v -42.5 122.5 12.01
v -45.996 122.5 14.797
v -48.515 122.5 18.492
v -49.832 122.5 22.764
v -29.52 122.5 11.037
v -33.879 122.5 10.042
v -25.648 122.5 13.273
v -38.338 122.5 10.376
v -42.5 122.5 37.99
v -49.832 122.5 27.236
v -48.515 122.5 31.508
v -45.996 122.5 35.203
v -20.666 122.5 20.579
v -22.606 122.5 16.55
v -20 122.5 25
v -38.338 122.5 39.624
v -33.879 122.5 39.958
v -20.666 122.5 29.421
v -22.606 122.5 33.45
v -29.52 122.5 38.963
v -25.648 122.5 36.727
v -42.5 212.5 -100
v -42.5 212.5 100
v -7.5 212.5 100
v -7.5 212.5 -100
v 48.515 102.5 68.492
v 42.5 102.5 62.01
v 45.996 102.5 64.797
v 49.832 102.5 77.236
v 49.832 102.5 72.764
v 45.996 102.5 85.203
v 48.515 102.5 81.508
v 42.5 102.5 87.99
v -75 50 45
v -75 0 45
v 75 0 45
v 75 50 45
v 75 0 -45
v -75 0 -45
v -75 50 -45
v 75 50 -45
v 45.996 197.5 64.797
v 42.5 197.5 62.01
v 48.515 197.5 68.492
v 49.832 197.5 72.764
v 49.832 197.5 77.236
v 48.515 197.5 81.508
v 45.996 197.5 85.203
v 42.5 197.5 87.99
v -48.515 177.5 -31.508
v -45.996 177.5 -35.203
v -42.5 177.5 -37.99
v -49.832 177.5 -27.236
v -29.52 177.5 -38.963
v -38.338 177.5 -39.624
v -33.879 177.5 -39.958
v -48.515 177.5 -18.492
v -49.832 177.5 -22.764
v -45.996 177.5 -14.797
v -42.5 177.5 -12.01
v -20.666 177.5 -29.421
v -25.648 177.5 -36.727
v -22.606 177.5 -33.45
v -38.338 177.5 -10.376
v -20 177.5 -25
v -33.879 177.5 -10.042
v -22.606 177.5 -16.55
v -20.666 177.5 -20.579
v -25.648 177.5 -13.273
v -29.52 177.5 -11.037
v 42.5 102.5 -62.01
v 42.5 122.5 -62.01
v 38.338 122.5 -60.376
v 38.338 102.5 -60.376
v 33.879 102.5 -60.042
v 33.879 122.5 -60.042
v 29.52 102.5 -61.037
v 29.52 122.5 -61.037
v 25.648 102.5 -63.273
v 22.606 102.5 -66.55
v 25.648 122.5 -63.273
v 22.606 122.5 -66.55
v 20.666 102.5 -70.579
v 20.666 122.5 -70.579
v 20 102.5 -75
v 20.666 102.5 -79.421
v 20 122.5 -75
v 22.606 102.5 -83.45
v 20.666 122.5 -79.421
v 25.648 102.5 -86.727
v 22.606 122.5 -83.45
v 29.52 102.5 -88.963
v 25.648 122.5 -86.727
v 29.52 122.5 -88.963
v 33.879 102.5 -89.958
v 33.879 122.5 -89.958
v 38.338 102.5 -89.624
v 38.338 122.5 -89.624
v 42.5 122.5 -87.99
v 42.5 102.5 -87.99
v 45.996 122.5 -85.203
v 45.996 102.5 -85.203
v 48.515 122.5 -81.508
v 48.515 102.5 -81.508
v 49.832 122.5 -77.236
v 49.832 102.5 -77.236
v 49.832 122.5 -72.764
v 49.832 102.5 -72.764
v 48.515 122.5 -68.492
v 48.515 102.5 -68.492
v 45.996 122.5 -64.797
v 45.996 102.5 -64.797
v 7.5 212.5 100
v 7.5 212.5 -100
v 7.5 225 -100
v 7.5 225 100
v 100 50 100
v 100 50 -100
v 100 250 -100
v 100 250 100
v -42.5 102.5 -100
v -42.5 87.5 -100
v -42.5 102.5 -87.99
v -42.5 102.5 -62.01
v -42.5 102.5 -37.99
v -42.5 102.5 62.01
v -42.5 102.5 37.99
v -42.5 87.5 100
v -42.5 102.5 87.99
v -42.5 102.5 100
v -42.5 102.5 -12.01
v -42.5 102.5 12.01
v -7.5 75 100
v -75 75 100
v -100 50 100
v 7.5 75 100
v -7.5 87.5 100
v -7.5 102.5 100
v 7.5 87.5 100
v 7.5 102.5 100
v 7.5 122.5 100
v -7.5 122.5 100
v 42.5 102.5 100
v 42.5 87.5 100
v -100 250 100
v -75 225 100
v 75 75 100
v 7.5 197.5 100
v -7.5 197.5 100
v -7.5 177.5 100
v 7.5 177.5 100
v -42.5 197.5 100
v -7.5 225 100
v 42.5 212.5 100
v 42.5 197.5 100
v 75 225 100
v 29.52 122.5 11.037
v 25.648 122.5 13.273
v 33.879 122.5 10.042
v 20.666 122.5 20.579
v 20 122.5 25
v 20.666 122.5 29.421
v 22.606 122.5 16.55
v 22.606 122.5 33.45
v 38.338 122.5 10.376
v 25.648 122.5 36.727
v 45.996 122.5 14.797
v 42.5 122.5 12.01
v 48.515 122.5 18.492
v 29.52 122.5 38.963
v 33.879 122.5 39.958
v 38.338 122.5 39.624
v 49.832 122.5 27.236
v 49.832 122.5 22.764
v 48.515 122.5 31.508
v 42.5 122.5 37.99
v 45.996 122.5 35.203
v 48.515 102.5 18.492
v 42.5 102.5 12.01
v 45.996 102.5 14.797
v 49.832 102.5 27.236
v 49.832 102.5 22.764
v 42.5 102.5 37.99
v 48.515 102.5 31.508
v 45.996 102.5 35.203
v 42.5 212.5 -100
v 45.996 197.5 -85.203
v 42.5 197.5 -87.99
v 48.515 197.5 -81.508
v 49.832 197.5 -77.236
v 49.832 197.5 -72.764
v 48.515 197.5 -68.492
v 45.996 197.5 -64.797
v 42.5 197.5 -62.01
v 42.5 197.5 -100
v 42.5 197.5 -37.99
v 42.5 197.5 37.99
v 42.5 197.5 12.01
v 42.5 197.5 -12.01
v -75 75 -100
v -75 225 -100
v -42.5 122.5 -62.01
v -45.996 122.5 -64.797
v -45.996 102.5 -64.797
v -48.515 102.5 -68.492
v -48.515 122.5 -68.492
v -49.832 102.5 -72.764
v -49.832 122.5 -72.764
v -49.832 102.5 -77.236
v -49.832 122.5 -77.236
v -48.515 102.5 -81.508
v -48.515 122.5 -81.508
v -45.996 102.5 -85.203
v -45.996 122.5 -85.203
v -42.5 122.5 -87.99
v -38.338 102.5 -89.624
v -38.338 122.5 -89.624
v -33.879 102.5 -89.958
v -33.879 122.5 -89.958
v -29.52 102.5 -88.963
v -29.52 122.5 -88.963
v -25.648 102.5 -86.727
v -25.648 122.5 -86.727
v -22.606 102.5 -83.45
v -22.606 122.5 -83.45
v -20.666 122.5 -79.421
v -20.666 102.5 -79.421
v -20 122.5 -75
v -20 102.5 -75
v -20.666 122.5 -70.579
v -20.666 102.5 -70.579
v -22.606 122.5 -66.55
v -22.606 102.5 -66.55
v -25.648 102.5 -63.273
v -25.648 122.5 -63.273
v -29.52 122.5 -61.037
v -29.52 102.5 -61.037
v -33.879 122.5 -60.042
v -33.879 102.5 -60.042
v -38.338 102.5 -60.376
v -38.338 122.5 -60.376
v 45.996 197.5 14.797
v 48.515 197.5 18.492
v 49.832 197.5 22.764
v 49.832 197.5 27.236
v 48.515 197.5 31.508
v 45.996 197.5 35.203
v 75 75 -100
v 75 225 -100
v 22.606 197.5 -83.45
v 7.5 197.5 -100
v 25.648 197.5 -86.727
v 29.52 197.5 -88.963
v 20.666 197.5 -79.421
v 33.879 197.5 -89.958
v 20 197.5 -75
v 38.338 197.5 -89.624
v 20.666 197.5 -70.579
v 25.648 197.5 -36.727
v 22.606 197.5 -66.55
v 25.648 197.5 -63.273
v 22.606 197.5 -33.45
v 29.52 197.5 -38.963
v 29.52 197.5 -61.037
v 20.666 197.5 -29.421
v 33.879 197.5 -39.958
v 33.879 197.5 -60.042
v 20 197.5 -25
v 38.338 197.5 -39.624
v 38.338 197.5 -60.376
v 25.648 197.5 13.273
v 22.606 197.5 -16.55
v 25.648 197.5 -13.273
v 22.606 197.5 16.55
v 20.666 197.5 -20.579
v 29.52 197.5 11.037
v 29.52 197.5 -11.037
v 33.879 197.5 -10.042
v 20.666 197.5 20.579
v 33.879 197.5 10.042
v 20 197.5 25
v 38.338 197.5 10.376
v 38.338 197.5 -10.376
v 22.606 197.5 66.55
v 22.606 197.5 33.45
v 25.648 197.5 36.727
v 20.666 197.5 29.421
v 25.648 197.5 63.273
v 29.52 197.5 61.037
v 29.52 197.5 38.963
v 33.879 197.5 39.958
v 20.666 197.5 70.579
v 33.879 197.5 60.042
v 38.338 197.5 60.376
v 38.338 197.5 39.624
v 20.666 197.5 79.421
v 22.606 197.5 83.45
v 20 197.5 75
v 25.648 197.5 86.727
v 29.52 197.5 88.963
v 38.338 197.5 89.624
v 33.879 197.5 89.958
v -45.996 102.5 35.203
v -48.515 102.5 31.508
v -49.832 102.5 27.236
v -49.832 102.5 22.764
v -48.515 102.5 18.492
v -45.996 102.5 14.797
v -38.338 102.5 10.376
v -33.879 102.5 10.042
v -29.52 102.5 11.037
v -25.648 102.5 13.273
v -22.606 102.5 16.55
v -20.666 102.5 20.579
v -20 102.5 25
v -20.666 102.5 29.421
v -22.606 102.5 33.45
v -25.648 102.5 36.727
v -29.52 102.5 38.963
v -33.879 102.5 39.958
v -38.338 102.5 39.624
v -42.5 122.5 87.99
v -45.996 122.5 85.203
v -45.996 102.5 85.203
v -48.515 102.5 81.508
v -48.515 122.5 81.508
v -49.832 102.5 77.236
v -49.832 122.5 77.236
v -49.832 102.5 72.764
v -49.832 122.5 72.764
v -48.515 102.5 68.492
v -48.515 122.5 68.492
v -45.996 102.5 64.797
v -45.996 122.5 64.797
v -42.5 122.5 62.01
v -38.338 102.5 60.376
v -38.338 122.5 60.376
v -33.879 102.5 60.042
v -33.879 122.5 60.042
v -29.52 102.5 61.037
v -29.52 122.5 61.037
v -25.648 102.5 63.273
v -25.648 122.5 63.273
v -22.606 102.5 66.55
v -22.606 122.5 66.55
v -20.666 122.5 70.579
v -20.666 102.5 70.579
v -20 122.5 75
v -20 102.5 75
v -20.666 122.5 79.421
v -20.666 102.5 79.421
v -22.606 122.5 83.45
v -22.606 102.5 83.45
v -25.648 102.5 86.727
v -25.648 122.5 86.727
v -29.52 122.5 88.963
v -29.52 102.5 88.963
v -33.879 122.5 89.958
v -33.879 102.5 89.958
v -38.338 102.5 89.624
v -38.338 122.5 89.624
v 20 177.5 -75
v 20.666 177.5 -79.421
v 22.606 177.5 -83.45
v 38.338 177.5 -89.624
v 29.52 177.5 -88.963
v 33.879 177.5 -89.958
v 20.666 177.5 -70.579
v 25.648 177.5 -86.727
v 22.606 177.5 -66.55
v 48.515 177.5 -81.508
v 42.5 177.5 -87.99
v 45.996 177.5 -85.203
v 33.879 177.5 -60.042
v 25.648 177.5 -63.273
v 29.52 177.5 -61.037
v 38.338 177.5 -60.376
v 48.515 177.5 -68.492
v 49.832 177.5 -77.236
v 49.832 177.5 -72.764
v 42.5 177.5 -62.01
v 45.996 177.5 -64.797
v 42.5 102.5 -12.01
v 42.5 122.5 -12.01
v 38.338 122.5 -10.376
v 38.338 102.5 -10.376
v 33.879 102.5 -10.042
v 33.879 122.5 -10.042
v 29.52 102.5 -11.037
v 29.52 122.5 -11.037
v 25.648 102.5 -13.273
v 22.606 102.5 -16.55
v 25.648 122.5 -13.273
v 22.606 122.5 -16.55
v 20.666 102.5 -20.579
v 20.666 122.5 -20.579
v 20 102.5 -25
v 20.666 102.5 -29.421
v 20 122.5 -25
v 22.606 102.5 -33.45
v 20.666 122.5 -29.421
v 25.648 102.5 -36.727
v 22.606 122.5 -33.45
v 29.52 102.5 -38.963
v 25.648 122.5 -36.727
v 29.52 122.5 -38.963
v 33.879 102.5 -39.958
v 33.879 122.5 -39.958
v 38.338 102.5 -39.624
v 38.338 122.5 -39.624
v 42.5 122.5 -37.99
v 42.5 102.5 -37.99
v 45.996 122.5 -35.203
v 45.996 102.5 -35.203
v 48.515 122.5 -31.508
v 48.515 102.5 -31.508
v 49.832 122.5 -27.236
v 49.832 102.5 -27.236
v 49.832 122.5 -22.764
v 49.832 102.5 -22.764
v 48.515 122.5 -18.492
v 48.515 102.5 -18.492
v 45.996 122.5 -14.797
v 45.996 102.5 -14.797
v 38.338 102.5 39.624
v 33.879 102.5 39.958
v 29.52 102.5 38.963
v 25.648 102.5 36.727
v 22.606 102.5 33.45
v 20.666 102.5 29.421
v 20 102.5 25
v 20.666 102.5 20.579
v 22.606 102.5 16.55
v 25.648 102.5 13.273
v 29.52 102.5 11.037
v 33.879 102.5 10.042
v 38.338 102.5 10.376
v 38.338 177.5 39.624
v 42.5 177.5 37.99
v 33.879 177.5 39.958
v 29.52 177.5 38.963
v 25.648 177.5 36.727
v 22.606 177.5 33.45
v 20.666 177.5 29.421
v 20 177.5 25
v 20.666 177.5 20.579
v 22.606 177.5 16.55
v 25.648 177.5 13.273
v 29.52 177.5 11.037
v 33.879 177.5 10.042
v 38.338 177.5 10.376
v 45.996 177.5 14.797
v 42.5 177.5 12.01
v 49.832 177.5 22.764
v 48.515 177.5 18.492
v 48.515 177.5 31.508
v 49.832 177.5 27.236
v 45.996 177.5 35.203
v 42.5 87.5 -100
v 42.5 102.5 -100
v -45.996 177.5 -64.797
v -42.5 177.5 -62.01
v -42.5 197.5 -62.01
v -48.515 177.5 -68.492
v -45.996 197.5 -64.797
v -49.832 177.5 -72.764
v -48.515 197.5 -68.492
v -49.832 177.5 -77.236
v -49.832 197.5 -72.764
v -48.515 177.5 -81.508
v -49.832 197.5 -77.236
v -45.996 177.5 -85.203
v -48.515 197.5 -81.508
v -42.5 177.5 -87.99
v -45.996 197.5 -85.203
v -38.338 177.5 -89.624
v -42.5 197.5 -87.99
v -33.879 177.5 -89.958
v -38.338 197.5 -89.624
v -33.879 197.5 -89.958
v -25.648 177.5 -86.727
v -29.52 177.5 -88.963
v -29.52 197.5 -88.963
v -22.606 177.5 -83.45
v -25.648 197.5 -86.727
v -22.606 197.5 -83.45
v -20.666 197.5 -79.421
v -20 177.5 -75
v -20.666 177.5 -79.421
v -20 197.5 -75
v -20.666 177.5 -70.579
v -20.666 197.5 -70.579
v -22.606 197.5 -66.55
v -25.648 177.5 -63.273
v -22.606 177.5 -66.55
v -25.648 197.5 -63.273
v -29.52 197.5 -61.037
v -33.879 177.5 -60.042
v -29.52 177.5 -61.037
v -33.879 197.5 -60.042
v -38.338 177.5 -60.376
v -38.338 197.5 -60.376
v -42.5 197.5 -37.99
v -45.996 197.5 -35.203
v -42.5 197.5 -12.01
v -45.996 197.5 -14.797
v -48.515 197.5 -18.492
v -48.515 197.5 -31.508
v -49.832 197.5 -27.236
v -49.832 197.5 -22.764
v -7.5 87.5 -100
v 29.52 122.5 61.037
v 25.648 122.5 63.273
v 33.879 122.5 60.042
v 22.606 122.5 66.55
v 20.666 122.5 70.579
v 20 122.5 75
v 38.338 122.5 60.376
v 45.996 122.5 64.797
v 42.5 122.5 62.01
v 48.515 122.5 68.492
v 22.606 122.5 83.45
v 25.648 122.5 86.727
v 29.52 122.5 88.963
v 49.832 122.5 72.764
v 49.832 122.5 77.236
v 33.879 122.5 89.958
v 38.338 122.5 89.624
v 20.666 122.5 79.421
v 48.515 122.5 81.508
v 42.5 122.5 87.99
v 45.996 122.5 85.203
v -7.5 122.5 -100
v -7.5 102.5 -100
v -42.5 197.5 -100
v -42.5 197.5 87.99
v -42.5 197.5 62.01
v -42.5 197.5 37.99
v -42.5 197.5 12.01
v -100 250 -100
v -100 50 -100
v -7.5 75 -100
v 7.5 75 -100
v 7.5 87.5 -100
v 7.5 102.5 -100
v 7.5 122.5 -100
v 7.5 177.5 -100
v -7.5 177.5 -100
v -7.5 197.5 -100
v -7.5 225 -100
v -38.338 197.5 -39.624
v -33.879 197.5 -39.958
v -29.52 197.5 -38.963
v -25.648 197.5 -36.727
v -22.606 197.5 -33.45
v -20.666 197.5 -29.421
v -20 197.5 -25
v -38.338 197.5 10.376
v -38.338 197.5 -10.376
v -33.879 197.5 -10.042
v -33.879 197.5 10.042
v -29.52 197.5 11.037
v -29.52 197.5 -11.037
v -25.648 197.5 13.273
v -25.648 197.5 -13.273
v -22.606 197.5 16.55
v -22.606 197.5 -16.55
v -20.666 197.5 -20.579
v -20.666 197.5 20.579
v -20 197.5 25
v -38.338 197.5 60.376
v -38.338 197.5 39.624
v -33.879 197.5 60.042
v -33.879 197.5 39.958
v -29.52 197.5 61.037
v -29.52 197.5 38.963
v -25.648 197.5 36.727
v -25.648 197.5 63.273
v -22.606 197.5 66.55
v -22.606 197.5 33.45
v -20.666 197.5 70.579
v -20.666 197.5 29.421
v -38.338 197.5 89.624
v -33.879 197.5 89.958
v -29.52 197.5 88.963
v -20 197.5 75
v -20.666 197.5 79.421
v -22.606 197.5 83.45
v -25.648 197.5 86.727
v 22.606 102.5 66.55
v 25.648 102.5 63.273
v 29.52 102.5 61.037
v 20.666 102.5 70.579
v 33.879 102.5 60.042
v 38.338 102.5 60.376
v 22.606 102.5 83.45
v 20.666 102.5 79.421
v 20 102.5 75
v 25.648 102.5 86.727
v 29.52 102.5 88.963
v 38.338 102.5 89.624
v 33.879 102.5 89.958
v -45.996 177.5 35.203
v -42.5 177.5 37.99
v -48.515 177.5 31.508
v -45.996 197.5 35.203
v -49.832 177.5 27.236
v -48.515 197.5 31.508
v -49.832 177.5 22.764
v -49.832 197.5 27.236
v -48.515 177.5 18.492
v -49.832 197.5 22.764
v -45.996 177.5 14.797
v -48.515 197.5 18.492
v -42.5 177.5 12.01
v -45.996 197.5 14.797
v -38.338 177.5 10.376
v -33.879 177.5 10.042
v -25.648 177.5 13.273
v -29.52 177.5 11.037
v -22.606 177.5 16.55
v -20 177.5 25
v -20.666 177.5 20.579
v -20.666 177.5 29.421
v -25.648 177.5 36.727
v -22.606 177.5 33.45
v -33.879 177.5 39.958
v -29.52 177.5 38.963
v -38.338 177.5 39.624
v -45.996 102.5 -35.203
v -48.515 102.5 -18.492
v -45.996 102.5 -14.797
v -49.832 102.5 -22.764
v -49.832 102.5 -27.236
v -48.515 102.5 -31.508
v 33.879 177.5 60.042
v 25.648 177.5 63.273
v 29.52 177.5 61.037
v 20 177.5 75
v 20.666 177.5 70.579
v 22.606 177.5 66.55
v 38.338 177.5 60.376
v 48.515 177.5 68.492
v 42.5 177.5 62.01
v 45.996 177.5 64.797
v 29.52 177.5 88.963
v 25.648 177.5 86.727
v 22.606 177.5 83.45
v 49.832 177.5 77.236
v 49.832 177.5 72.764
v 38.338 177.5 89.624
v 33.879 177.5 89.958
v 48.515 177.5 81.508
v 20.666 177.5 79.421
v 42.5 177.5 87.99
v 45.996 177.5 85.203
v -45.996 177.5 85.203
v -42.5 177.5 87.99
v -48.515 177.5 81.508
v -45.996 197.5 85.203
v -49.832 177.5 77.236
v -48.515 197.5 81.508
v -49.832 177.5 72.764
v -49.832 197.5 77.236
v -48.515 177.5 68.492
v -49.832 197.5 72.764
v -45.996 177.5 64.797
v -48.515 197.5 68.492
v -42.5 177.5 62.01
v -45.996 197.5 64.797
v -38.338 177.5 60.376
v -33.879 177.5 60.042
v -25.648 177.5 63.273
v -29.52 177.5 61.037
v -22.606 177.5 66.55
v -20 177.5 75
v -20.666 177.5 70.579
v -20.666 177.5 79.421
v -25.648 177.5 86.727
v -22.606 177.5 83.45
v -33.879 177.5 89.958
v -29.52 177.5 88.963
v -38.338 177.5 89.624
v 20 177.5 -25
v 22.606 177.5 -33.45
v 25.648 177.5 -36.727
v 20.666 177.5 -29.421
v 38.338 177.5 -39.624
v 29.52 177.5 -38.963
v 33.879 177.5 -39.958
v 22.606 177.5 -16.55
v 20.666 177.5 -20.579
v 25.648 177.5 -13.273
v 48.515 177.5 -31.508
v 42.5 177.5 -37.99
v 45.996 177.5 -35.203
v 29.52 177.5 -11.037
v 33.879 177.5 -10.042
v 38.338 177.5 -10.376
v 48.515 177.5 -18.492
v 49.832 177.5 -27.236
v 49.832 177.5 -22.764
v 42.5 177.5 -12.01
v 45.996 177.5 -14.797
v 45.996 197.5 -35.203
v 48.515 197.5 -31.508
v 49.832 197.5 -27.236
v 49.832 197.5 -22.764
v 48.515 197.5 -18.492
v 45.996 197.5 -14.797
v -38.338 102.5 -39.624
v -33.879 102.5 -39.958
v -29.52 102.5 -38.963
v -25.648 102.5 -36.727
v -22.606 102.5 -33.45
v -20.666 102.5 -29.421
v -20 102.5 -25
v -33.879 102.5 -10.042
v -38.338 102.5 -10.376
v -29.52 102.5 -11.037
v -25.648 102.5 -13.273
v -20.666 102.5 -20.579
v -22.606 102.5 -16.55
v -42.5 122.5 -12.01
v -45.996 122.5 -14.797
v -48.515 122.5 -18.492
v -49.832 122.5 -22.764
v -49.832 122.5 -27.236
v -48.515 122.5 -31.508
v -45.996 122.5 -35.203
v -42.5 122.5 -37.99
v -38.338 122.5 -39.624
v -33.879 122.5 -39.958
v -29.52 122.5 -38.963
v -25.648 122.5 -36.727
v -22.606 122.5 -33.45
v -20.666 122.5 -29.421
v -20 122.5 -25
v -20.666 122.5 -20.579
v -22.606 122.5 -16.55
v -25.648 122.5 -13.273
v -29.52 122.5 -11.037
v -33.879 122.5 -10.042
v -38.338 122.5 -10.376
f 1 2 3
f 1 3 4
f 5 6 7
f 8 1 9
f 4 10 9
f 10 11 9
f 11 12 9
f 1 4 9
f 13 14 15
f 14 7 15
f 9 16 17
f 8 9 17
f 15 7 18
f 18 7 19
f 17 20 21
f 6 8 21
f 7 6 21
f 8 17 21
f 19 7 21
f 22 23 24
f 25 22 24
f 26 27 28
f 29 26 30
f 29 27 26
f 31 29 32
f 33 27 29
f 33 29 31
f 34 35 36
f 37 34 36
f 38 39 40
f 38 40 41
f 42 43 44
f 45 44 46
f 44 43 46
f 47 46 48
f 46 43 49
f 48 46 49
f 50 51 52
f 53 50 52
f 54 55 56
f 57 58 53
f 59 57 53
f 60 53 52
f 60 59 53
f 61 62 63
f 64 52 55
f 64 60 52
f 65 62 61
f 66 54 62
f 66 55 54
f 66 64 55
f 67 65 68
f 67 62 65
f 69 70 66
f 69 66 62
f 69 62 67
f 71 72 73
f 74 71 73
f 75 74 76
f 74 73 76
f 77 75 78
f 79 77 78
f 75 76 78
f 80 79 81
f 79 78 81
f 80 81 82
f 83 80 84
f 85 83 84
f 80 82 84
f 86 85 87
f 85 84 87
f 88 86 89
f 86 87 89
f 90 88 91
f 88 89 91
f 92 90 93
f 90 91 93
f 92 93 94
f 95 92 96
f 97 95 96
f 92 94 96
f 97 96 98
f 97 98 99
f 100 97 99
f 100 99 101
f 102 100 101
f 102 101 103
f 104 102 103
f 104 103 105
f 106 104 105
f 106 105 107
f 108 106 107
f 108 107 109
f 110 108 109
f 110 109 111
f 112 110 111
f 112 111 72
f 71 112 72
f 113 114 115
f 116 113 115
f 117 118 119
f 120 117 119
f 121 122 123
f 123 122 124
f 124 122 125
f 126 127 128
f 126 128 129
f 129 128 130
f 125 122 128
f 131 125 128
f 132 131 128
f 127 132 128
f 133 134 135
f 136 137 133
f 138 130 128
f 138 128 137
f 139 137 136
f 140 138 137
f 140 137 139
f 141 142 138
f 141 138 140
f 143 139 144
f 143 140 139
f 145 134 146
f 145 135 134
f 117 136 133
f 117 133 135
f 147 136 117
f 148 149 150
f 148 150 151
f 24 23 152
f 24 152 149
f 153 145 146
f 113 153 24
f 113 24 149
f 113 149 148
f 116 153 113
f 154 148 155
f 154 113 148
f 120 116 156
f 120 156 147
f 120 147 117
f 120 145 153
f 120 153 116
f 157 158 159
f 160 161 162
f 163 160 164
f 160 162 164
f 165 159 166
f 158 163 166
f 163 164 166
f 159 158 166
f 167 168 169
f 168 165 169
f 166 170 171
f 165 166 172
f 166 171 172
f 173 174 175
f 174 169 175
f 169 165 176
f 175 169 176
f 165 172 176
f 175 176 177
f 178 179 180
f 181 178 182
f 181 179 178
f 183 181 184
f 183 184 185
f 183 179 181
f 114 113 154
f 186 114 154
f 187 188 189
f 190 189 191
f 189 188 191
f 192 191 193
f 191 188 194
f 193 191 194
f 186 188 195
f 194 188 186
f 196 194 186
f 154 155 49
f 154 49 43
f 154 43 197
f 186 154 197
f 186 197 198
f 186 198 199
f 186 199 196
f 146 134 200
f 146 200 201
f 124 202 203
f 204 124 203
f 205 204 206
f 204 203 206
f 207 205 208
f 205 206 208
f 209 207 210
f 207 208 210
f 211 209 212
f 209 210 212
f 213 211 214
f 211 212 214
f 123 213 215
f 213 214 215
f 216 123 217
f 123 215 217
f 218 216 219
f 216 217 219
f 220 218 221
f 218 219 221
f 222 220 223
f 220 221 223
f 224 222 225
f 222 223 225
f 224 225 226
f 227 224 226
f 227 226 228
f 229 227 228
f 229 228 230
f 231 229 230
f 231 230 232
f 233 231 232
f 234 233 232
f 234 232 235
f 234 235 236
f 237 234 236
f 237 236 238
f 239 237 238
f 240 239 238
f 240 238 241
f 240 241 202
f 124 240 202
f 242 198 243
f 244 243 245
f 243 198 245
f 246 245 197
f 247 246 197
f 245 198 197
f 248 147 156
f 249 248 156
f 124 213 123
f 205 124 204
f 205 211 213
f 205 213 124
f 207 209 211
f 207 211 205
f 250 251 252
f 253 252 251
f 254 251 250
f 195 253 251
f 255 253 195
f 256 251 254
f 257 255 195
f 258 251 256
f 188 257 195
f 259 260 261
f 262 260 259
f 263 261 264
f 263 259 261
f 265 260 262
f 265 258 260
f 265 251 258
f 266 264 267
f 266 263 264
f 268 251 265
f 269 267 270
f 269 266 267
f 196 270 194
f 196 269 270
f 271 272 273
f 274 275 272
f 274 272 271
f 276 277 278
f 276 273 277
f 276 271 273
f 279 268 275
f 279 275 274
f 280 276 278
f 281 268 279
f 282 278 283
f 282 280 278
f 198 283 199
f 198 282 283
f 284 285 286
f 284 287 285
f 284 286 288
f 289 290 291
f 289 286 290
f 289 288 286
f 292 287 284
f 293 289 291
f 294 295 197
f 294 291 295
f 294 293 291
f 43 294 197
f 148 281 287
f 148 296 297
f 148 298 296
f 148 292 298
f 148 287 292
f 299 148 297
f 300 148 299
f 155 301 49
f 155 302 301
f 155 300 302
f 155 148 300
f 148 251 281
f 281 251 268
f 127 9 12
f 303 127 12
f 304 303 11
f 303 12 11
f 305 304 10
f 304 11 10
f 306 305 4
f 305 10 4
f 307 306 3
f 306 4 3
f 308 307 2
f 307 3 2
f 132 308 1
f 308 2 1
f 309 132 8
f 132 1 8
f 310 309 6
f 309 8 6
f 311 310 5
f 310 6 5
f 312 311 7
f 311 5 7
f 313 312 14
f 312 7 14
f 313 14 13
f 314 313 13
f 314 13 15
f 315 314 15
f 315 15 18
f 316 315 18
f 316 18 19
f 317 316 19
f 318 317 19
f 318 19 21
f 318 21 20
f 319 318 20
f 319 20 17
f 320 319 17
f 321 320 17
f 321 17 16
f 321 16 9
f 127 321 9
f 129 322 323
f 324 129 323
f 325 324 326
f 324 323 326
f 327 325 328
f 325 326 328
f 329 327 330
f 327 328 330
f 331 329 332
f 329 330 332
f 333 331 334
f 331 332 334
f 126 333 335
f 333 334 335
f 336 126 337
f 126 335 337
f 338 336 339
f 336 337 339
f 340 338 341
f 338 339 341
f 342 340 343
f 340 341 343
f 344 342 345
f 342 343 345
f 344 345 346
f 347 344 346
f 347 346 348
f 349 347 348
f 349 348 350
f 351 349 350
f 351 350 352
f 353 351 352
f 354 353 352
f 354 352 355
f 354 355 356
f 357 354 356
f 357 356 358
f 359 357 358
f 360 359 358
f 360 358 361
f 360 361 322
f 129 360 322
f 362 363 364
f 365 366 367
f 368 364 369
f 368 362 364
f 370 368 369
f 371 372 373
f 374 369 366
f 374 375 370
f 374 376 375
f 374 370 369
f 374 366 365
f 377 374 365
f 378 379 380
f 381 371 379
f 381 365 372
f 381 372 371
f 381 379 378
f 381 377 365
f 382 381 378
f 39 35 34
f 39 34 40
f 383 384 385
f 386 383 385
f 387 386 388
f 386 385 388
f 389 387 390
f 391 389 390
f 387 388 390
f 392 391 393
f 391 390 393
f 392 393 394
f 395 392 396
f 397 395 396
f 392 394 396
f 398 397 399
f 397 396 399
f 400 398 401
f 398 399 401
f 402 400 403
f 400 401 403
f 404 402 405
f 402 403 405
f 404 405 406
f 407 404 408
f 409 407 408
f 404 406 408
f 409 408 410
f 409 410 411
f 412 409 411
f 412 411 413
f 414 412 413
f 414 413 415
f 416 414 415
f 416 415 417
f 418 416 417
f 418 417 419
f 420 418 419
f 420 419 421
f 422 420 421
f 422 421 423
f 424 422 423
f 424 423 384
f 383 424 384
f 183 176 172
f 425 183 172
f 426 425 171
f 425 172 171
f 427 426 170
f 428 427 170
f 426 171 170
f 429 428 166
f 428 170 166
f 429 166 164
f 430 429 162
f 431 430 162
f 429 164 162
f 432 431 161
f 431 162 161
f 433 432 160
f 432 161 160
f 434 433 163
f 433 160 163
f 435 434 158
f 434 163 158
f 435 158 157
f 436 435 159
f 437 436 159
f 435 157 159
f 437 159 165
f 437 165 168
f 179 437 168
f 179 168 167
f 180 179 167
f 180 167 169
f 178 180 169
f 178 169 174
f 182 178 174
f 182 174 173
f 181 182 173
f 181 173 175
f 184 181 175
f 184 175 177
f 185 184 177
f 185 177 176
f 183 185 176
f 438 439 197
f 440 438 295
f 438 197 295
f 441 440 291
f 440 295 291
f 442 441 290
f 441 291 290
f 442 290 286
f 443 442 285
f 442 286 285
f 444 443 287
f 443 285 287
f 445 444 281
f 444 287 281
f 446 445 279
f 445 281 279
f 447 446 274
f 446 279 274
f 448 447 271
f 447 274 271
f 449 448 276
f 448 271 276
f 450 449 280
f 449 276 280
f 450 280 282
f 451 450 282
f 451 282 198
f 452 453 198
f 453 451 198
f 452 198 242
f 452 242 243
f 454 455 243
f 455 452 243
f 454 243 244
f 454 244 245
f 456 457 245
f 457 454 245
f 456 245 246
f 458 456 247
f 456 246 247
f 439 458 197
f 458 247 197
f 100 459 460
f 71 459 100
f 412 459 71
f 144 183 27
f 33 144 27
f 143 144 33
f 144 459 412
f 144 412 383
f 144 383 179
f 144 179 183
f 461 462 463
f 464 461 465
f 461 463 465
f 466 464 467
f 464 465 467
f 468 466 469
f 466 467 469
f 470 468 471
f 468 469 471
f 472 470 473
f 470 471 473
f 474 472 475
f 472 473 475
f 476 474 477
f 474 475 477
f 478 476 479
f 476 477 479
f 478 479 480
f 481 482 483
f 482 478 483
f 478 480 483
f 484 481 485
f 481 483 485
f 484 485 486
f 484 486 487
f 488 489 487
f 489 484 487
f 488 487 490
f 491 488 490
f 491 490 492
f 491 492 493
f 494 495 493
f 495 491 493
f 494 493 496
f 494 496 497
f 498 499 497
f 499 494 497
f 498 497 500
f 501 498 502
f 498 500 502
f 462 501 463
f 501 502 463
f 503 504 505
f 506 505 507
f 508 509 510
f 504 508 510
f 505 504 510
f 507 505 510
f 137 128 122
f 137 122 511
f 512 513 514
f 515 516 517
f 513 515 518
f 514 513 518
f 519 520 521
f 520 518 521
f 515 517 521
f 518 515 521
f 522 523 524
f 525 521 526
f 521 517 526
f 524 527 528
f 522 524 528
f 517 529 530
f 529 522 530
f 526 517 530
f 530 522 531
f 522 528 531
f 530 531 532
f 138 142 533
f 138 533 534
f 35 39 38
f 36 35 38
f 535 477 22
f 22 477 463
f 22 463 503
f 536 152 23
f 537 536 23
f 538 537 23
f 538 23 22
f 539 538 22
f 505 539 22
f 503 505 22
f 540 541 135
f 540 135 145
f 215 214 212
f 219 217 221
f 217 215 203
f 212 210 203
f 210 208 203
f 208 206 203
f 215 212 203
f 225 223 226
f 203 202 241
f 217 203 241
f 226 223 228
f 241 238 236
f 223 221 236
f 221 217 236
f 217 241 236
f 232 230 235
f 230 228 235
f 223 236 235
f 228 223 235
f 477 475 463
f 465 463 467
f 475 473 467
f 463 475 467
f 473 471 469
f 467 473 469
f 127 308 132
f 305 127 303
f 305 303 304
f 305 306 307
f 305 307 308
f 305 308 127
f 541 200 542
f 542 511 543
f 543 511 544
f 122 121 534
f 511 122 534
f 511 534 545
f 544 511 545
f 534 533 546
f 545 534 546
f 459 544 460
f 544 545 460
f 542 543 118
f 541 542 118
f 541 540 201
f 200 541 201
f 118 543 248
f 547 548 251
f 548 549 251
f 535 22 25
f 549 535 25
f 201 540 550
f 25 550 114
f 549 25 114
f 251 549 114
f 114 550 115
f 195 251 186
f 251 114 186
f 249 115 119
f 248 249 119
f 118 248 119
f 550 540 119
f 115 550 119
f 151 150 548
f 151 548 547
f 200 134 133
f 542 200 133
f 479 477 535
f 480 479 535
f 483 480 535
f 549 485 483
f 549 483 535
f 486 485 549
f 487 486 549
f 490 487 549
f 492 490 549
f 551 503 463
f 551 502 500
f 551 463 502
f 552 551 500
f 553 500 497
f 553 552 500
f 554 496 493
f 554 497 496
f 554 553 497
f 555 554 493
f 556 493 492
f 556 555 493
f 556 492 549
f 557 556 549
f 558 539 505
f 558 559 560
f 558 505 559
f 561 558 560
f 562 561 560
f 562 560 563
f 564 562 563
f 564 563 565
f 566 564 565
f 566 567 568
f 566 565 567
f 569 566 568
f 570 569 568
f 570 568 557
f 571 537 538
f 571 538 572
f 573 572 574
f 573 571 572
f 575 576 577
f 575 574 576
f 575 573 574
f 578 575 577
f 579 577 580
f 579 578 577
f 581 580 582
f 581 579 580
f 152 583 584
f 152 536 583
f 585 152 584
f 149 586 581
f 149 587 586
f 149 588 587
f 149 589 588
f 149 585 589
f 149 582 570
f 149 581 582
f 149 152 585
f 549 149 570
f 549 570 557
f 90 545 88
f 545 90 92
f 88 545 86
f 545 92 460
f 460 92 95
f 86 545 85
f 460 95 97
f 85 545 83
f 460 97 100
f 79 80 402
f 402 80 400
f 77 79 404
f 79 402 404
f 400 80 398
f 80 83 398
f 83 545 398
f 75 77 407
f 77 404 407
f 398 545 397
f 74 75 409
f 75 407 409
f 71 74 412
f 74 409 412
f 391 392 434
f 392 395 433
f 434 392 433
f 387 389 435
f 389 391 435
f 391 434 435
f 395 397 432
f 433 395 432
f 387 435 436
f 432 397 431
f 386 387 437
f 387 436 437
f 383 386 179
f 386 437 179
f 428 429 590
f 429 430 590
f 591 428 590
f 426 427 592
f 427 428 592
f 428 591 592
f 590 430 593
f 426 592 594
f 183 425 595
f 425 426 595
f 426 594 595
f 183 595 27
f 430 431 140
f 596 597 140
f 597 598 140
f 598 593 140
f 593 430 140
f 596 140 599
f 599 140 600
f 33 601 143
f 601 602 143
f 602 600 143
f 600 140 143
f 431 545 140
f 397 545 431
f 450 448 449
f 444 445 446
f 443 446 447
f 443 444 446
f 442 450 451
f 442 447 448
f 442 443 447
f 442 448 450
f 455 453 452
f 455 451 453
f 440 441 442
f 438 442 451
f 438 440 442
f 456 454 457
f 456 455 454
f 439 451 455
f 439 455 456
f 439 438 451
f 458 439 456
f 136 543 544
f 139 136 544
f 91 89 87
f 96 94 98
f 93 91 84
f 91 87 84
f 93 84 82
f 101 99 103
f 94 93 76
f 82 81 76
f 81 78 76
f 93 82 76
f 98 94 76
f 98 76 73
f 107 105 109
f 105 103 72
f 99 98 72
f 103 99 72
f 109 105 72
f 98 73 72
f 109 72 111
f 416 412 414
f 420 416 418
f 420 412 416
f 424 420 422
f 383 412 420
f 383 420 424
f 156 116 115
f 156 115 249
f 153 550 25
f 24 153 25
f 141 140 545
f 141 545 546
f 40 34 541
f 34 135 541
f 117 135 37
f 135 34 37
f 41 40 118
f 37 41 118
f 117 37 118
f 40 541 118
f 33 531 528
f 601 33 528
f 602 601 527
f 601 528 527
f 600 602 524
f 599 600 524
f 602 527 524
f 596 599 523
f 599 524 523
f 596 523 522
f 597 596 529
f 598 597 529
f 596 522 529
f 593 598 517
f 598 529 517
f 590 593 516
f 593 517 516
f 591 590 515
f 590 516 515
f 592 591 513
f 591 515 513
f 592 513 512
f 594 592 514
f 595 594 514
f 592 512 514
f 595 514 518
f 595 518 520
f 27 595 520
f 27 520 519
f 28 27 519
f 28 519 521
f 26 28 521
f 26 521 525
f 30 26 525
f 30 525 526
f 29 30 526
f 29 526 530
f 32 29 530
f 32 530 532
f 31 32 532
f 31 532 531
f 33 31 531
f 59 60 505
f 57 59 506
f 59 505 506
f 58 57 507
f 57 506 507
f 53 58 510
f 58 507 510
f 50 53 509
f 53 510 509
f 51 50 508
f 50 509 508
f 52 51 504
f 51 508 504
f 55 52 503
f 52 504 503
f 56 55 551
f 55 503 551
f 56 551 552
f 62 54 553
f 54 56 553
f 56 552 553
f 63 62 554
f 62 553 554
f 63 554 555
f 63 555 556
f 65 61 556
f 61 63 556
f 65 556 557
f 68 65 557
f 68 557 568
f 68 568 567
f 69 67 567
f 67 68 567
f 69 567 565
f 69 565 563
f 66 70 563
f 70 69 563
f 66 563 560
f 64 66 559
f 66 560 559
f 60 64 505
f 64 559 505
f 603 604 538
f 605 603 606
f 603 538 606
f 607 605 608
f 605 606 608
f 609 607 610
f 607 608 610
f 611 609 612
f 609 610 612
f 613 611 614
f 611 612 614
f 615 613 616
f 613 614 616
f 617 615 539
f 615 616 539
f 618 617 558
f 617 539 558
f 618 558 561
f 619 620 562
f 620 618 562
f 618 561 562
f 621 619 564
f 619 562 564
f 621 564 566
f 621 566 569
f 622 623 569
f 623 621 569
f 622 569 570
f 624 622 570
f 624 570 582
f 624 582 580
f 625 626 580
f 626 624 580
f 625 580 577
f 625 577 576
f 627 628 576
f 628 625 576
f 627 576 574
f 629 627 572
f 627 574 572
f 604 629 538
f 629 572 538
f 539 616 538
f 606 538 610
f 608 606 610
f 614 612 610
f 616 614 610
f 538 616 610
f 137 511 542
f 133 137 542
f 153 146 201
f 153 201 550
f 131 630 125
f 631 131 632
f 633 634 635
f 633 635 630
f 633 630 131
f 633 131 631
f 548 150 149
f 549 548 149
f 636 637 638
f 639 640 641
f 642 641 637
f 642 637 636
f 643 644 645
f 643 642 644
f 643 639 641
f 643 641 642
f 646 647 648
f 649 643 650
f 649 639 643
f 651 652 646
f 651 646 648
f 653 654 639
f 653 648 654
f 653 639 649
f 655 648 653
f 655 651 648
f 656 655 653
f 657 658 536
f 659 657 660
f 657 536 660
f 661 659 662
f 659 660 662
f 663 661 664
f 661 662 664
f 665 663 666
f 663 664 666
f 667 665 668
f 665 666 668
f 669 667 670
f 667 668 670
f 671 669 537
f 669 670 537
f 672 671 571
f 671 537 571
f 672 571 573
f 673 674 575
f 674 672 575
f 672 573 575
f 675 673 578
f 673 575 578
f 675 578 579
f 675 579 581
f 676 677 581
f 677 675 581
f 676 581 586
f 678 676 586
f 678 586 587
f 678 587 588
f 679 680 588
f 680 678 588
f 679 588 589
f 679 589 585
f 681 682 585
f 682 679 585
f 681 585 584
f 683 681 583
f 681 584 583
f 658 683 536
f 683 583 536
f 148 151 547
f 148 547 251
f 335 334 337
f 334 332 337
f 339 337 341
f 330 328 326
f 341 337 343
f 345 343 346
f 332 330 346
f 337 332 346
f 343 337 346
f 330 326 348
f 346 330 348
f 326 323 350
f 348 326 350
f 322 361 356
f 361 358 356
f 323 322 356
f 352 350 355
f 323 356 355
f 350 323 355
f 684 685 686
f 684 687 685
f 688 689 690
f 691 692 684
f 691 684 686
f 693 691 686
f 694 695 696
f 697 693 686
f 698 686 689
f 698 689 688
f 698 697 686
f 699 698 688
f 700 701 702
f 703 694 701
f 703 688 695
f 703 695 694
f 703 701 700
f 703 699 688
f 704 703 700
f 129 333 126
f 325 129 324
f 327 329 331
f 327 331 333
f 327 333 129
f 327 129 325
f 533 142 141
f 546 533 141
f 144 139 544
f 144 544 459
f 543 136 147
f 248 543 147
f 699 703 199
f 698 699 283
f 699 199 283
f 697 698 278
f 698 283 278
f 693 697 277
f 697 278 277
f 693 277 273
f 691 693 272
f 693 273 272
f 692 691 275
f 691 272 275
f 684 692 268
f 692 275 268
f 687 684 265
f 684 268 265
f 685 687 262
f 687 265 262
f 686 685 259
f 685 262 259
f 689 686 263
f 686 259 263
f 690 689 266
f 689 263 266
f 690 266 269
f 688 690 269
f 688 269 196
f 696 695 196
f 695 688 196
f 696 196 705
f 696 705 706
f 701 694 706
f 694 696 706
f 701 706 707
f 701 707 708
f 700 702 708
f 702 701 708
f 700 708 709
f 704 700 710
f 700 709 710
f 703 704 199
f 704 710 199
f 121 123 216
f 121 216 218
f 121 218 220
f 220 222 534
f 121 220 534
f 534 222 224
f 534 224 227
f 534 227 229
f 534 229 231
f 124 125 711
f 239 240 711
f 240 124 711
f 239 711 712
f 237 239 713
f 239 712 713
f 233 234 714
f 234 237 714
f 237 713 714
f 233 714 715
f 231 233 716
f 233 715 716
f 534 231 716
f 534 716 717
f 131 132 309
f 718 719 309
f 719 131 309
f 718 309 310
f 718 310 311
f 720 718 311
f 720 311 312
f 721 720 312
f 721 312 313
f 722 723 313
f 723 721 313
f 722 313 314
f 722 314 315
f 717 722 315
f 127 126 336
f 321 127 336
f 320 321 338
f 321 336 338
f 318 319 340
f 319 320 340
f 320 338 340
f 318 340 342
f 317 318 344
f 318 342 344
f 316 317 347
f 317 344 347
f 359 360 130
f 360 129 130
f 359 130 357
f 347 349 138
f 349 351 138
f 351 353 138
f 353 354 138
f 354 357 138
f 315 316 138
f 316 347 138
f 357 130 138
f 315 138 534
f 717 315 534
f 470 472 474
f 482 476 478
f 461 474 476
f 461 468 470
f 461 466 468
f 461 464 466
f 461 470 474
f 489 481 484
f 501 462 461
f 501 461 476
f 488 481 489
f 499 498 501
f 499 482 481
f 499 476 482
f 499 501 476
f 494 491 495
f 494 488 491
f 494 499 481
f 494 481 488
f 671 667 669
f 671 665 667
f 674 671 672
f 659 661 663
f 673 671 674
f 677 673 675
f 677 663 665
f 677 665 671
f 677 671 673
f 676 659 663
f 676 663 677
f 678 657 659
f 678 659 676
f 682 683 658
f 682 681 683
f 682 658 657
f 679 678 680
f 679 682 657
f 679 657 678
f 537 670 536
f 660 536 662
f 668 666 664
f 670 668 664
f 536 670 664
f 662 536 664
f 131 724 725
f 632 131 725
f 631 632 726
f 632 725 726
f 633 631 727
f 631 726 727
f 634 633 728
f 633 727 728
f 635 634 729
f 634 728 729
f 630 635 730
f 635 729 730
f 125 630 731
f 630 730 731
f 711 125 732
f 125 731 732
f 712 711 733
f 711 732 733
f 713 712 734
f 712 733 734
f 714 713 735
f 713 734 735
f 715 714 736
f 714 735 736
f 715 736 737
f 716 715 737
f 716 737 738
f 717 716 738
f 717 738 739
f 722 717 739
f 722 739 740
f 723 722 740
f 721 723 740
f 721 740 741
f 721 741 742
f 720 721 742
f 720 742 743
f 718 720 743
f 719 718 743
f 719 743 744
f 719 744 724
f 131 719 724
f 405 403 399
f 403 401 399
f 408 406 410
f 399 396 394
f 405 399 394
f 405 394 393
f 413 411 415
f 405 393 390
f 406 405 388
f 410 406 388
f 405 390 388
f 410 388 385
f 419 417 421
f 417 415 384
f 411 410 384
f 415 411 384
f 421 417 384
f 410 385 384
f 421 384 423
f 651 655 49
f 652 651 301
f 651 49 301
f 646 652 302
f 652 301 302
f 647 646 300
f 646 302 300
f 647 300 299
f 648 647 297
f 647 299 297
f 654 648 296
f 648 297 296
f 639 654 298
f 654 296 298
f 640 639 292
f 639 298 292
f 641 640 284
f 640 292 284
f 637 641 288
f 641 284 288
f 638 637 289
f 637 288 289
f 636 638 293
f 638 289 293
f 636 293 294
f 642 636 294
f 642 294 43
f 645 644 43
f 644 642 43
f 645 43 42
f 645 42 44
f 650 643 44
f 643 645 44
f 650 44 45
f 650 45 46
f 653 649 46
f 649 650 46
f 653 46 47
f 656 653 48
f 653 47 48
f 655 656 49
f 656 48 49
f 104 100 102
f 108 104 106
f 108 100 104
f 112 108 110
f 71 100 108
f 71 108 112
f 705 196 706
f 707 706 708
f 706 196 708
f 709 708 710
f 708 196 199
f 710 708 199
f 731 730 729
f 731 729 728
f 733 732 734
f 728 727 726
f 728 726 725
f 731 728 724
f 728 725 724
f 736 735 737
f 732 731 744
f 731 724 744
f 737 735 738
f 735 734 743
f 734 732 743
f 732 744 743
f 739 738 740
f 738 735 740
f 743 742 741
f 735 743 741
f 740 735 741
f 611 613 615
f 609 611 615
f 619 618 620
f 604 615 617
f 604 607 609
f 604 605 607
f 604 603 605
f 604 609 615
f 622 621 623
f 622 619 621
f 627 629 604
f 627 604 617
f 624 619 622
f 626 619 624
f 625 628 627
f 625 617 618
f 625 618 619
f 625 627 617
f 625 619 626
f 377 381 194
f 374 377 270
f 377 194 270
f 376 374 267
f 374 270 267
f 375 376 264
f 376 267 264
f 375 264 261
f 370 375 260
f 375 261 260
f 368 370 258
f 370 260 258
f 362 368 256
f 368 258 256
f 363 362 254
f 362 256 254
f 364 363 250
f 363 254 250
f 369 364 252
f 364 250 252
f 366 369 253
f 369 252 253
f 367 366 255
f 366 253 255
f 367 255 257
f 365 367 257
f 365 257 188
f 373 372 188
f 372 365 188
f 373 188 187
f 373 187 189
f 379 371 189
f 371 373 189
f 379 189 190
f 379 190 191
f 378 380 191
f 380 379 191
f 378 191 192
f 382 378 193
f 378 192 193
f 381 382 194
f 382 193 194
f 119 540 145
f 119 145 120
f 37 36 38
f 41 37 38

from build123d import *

# Parameters (mm, degrees)
SKETCH1_W           = 150
SKETCH1_H           = 90
BOSS_EXTRUDE1_DEPTH = 50
BOSS_EXTRUDE2_START = -100
SKETCH2_W           = 200
SKETCH2_H           = 200
BOSS_EXTRUDE2_DEPTH = 200
SKETCH3_W           = 150
SKETCH3_H           = 150
CUT_EXTRUDE1_DEPTH  = 200
SKETCH4_W           = 15
SKETCH4_H           = 15
SKETCH4_H_2         = 12.5
SKETCH4_W_2         = 35
BOSS_EXTRUDE3_DEPTH = 200
SKETCH6_W           = 15
SKETCH6_H           = 15
BOSS_EXTRUDE4_DEPTH = 200
SKETCH5_R           = 15
BOSS_EXTRUDE5_DEPTH = 95
SKETCH7_W           = 150
SKETCH7_H           = 55
CUT_EXTRUDE2_DEPTH  = 200


with BuildPart() as part:
    # Sketch1 → Boss-Extrude1 (new body)
    with BuildSketch(Plane(origin=(0, 0, 0), x_dir=(1, 0, 0), z_dir=(0, 1, 0))):
        Rectangle(SKETCH1_W, SKETCH1_H)
    extrude(amount=BOSS_EXTRUDE1_DEPTH)

    # Sketch2 → Boss-Extrude2 (add)
    with BuildSketch(Plane.XY.offset(BOSS_EXTRUDE2_START)):
        with Locations((0, 150)):
            Rectangle(SKETCH2_W, SKETCH2_H)
    extrude(amount=BOSS_EXTRUDE2_DEPTH)

    # Sketch3 → Cut-Extrude1 (cut)
    with BuildSketch(Plane.XY.offset(100)):
        with Locations((0, 150)):
            Rectangle(SKETCH3_W, SKETCH3_H)
    extrude(amount=-CUT_EXTRUDE1_DEPTH, mode=Mode.SUBTRACT)

    # Sketch4 → Boss-Extrude3 (add)
    with BuildSketch(Plane.XY.offset(100)):
        with Locations((0, 205)):
            Rectangle(SKETCH4_W, SKETCH4_H)
        with Locations((0, 218.75)):
            Rectangle(SKETCH4_W, SKETCH4_H_2)
        with Locations((-25, 205)):
            Rectangle(SKETCH4_W_2, SKETCH4_H)
        with Locations((25, 205)):
            Rectangle(SKETCH4_W_2, SKETCH4_H)
        with Locations((0, 191.25)):
            Rectangle(SKETCH4_W, SKETCH4_H_2)
        with Locations((0, 108.75)):
            Rectangle(SKETCH4_W, SKETCH4_H_2)
        with Locations((0, 95)):
            Rectangle(SKETCH4_W, SKETCH4_H)
        with Locations((0, 81.25)):
            Rectangle(SKETCH4_W, SKETCH4_H_2)
        with Locations((-25, 95)):
            Rectangle(SKETCH4_W_2, SKETCH4_H)
        with Locations((25, 95)):
            Rectangle(SKETCH4_W_2, SKETCH4_H)
    extrude(amount=-BOSS_EXTRUDE3_DEPTH)

    # Sketch6 → Boss-Extrude4 (add)
    with BuildSketch(Plane.XY.offset(100)):
        with Locations((0, 185)):
            Rectangle(SKETCH6_W, SKETCH6_H)
        with Locations((0, 115)):
            Rectangle(SKETCH6_W, SKETCH6_H)
    extrude(amount=-BOSS_EXTRUDE4_DEPTH)

    # Sketch5 → Boss-Extrude5 (add)
    with BuildSketch(Plane.XZ.offset(-197.5)):
        with Locations(Location((35, 75, 0), (0, 0, 60))):
            Circle(SKETCH5_R)
        with Locations(Location((35, 25, 0), (0, 0, 60))):
            Circle(SKETCH5_R)
        with Locations(Location((35, -25, 0), (0, 0, 60))):
            Circle(SKETCH5_R)
        with Locations(Location((35, -75, 0), (0, 0, 60))):
            Circle(SKETCH5_R)
        with Locations(Location((-35, 75, 0), (0, 0, 120))):
            Circle(SKETCH5_R)
        with Locations(Location((-35, 25, 0), (0, 0, 120))):
            Circle(SKETCH5_R)
        with Locations(Location((-35, -25, 0), (0, 0, 120))):
            Circle(SKETCH5_R)
        with Locations(Location((-35, -75, 0), (0, 0, 120))):
            Circle(SKETCH5_R)
    extrude(amount=BOSS_EXTRUDE5_DEPTH)

    # Sketch7 → Cut-Extrude2 (cut)
    with BuildSketch(Plane.XY.offset(100)):
        with Locations((0, 150)):
            Rectangle(SKETCH7_W, SKETCH7_H)
    extrude(amount=-CUT_EXTRUDE2_DEPTH, mode=Mode.SUBTRACT)


solid = part.part
